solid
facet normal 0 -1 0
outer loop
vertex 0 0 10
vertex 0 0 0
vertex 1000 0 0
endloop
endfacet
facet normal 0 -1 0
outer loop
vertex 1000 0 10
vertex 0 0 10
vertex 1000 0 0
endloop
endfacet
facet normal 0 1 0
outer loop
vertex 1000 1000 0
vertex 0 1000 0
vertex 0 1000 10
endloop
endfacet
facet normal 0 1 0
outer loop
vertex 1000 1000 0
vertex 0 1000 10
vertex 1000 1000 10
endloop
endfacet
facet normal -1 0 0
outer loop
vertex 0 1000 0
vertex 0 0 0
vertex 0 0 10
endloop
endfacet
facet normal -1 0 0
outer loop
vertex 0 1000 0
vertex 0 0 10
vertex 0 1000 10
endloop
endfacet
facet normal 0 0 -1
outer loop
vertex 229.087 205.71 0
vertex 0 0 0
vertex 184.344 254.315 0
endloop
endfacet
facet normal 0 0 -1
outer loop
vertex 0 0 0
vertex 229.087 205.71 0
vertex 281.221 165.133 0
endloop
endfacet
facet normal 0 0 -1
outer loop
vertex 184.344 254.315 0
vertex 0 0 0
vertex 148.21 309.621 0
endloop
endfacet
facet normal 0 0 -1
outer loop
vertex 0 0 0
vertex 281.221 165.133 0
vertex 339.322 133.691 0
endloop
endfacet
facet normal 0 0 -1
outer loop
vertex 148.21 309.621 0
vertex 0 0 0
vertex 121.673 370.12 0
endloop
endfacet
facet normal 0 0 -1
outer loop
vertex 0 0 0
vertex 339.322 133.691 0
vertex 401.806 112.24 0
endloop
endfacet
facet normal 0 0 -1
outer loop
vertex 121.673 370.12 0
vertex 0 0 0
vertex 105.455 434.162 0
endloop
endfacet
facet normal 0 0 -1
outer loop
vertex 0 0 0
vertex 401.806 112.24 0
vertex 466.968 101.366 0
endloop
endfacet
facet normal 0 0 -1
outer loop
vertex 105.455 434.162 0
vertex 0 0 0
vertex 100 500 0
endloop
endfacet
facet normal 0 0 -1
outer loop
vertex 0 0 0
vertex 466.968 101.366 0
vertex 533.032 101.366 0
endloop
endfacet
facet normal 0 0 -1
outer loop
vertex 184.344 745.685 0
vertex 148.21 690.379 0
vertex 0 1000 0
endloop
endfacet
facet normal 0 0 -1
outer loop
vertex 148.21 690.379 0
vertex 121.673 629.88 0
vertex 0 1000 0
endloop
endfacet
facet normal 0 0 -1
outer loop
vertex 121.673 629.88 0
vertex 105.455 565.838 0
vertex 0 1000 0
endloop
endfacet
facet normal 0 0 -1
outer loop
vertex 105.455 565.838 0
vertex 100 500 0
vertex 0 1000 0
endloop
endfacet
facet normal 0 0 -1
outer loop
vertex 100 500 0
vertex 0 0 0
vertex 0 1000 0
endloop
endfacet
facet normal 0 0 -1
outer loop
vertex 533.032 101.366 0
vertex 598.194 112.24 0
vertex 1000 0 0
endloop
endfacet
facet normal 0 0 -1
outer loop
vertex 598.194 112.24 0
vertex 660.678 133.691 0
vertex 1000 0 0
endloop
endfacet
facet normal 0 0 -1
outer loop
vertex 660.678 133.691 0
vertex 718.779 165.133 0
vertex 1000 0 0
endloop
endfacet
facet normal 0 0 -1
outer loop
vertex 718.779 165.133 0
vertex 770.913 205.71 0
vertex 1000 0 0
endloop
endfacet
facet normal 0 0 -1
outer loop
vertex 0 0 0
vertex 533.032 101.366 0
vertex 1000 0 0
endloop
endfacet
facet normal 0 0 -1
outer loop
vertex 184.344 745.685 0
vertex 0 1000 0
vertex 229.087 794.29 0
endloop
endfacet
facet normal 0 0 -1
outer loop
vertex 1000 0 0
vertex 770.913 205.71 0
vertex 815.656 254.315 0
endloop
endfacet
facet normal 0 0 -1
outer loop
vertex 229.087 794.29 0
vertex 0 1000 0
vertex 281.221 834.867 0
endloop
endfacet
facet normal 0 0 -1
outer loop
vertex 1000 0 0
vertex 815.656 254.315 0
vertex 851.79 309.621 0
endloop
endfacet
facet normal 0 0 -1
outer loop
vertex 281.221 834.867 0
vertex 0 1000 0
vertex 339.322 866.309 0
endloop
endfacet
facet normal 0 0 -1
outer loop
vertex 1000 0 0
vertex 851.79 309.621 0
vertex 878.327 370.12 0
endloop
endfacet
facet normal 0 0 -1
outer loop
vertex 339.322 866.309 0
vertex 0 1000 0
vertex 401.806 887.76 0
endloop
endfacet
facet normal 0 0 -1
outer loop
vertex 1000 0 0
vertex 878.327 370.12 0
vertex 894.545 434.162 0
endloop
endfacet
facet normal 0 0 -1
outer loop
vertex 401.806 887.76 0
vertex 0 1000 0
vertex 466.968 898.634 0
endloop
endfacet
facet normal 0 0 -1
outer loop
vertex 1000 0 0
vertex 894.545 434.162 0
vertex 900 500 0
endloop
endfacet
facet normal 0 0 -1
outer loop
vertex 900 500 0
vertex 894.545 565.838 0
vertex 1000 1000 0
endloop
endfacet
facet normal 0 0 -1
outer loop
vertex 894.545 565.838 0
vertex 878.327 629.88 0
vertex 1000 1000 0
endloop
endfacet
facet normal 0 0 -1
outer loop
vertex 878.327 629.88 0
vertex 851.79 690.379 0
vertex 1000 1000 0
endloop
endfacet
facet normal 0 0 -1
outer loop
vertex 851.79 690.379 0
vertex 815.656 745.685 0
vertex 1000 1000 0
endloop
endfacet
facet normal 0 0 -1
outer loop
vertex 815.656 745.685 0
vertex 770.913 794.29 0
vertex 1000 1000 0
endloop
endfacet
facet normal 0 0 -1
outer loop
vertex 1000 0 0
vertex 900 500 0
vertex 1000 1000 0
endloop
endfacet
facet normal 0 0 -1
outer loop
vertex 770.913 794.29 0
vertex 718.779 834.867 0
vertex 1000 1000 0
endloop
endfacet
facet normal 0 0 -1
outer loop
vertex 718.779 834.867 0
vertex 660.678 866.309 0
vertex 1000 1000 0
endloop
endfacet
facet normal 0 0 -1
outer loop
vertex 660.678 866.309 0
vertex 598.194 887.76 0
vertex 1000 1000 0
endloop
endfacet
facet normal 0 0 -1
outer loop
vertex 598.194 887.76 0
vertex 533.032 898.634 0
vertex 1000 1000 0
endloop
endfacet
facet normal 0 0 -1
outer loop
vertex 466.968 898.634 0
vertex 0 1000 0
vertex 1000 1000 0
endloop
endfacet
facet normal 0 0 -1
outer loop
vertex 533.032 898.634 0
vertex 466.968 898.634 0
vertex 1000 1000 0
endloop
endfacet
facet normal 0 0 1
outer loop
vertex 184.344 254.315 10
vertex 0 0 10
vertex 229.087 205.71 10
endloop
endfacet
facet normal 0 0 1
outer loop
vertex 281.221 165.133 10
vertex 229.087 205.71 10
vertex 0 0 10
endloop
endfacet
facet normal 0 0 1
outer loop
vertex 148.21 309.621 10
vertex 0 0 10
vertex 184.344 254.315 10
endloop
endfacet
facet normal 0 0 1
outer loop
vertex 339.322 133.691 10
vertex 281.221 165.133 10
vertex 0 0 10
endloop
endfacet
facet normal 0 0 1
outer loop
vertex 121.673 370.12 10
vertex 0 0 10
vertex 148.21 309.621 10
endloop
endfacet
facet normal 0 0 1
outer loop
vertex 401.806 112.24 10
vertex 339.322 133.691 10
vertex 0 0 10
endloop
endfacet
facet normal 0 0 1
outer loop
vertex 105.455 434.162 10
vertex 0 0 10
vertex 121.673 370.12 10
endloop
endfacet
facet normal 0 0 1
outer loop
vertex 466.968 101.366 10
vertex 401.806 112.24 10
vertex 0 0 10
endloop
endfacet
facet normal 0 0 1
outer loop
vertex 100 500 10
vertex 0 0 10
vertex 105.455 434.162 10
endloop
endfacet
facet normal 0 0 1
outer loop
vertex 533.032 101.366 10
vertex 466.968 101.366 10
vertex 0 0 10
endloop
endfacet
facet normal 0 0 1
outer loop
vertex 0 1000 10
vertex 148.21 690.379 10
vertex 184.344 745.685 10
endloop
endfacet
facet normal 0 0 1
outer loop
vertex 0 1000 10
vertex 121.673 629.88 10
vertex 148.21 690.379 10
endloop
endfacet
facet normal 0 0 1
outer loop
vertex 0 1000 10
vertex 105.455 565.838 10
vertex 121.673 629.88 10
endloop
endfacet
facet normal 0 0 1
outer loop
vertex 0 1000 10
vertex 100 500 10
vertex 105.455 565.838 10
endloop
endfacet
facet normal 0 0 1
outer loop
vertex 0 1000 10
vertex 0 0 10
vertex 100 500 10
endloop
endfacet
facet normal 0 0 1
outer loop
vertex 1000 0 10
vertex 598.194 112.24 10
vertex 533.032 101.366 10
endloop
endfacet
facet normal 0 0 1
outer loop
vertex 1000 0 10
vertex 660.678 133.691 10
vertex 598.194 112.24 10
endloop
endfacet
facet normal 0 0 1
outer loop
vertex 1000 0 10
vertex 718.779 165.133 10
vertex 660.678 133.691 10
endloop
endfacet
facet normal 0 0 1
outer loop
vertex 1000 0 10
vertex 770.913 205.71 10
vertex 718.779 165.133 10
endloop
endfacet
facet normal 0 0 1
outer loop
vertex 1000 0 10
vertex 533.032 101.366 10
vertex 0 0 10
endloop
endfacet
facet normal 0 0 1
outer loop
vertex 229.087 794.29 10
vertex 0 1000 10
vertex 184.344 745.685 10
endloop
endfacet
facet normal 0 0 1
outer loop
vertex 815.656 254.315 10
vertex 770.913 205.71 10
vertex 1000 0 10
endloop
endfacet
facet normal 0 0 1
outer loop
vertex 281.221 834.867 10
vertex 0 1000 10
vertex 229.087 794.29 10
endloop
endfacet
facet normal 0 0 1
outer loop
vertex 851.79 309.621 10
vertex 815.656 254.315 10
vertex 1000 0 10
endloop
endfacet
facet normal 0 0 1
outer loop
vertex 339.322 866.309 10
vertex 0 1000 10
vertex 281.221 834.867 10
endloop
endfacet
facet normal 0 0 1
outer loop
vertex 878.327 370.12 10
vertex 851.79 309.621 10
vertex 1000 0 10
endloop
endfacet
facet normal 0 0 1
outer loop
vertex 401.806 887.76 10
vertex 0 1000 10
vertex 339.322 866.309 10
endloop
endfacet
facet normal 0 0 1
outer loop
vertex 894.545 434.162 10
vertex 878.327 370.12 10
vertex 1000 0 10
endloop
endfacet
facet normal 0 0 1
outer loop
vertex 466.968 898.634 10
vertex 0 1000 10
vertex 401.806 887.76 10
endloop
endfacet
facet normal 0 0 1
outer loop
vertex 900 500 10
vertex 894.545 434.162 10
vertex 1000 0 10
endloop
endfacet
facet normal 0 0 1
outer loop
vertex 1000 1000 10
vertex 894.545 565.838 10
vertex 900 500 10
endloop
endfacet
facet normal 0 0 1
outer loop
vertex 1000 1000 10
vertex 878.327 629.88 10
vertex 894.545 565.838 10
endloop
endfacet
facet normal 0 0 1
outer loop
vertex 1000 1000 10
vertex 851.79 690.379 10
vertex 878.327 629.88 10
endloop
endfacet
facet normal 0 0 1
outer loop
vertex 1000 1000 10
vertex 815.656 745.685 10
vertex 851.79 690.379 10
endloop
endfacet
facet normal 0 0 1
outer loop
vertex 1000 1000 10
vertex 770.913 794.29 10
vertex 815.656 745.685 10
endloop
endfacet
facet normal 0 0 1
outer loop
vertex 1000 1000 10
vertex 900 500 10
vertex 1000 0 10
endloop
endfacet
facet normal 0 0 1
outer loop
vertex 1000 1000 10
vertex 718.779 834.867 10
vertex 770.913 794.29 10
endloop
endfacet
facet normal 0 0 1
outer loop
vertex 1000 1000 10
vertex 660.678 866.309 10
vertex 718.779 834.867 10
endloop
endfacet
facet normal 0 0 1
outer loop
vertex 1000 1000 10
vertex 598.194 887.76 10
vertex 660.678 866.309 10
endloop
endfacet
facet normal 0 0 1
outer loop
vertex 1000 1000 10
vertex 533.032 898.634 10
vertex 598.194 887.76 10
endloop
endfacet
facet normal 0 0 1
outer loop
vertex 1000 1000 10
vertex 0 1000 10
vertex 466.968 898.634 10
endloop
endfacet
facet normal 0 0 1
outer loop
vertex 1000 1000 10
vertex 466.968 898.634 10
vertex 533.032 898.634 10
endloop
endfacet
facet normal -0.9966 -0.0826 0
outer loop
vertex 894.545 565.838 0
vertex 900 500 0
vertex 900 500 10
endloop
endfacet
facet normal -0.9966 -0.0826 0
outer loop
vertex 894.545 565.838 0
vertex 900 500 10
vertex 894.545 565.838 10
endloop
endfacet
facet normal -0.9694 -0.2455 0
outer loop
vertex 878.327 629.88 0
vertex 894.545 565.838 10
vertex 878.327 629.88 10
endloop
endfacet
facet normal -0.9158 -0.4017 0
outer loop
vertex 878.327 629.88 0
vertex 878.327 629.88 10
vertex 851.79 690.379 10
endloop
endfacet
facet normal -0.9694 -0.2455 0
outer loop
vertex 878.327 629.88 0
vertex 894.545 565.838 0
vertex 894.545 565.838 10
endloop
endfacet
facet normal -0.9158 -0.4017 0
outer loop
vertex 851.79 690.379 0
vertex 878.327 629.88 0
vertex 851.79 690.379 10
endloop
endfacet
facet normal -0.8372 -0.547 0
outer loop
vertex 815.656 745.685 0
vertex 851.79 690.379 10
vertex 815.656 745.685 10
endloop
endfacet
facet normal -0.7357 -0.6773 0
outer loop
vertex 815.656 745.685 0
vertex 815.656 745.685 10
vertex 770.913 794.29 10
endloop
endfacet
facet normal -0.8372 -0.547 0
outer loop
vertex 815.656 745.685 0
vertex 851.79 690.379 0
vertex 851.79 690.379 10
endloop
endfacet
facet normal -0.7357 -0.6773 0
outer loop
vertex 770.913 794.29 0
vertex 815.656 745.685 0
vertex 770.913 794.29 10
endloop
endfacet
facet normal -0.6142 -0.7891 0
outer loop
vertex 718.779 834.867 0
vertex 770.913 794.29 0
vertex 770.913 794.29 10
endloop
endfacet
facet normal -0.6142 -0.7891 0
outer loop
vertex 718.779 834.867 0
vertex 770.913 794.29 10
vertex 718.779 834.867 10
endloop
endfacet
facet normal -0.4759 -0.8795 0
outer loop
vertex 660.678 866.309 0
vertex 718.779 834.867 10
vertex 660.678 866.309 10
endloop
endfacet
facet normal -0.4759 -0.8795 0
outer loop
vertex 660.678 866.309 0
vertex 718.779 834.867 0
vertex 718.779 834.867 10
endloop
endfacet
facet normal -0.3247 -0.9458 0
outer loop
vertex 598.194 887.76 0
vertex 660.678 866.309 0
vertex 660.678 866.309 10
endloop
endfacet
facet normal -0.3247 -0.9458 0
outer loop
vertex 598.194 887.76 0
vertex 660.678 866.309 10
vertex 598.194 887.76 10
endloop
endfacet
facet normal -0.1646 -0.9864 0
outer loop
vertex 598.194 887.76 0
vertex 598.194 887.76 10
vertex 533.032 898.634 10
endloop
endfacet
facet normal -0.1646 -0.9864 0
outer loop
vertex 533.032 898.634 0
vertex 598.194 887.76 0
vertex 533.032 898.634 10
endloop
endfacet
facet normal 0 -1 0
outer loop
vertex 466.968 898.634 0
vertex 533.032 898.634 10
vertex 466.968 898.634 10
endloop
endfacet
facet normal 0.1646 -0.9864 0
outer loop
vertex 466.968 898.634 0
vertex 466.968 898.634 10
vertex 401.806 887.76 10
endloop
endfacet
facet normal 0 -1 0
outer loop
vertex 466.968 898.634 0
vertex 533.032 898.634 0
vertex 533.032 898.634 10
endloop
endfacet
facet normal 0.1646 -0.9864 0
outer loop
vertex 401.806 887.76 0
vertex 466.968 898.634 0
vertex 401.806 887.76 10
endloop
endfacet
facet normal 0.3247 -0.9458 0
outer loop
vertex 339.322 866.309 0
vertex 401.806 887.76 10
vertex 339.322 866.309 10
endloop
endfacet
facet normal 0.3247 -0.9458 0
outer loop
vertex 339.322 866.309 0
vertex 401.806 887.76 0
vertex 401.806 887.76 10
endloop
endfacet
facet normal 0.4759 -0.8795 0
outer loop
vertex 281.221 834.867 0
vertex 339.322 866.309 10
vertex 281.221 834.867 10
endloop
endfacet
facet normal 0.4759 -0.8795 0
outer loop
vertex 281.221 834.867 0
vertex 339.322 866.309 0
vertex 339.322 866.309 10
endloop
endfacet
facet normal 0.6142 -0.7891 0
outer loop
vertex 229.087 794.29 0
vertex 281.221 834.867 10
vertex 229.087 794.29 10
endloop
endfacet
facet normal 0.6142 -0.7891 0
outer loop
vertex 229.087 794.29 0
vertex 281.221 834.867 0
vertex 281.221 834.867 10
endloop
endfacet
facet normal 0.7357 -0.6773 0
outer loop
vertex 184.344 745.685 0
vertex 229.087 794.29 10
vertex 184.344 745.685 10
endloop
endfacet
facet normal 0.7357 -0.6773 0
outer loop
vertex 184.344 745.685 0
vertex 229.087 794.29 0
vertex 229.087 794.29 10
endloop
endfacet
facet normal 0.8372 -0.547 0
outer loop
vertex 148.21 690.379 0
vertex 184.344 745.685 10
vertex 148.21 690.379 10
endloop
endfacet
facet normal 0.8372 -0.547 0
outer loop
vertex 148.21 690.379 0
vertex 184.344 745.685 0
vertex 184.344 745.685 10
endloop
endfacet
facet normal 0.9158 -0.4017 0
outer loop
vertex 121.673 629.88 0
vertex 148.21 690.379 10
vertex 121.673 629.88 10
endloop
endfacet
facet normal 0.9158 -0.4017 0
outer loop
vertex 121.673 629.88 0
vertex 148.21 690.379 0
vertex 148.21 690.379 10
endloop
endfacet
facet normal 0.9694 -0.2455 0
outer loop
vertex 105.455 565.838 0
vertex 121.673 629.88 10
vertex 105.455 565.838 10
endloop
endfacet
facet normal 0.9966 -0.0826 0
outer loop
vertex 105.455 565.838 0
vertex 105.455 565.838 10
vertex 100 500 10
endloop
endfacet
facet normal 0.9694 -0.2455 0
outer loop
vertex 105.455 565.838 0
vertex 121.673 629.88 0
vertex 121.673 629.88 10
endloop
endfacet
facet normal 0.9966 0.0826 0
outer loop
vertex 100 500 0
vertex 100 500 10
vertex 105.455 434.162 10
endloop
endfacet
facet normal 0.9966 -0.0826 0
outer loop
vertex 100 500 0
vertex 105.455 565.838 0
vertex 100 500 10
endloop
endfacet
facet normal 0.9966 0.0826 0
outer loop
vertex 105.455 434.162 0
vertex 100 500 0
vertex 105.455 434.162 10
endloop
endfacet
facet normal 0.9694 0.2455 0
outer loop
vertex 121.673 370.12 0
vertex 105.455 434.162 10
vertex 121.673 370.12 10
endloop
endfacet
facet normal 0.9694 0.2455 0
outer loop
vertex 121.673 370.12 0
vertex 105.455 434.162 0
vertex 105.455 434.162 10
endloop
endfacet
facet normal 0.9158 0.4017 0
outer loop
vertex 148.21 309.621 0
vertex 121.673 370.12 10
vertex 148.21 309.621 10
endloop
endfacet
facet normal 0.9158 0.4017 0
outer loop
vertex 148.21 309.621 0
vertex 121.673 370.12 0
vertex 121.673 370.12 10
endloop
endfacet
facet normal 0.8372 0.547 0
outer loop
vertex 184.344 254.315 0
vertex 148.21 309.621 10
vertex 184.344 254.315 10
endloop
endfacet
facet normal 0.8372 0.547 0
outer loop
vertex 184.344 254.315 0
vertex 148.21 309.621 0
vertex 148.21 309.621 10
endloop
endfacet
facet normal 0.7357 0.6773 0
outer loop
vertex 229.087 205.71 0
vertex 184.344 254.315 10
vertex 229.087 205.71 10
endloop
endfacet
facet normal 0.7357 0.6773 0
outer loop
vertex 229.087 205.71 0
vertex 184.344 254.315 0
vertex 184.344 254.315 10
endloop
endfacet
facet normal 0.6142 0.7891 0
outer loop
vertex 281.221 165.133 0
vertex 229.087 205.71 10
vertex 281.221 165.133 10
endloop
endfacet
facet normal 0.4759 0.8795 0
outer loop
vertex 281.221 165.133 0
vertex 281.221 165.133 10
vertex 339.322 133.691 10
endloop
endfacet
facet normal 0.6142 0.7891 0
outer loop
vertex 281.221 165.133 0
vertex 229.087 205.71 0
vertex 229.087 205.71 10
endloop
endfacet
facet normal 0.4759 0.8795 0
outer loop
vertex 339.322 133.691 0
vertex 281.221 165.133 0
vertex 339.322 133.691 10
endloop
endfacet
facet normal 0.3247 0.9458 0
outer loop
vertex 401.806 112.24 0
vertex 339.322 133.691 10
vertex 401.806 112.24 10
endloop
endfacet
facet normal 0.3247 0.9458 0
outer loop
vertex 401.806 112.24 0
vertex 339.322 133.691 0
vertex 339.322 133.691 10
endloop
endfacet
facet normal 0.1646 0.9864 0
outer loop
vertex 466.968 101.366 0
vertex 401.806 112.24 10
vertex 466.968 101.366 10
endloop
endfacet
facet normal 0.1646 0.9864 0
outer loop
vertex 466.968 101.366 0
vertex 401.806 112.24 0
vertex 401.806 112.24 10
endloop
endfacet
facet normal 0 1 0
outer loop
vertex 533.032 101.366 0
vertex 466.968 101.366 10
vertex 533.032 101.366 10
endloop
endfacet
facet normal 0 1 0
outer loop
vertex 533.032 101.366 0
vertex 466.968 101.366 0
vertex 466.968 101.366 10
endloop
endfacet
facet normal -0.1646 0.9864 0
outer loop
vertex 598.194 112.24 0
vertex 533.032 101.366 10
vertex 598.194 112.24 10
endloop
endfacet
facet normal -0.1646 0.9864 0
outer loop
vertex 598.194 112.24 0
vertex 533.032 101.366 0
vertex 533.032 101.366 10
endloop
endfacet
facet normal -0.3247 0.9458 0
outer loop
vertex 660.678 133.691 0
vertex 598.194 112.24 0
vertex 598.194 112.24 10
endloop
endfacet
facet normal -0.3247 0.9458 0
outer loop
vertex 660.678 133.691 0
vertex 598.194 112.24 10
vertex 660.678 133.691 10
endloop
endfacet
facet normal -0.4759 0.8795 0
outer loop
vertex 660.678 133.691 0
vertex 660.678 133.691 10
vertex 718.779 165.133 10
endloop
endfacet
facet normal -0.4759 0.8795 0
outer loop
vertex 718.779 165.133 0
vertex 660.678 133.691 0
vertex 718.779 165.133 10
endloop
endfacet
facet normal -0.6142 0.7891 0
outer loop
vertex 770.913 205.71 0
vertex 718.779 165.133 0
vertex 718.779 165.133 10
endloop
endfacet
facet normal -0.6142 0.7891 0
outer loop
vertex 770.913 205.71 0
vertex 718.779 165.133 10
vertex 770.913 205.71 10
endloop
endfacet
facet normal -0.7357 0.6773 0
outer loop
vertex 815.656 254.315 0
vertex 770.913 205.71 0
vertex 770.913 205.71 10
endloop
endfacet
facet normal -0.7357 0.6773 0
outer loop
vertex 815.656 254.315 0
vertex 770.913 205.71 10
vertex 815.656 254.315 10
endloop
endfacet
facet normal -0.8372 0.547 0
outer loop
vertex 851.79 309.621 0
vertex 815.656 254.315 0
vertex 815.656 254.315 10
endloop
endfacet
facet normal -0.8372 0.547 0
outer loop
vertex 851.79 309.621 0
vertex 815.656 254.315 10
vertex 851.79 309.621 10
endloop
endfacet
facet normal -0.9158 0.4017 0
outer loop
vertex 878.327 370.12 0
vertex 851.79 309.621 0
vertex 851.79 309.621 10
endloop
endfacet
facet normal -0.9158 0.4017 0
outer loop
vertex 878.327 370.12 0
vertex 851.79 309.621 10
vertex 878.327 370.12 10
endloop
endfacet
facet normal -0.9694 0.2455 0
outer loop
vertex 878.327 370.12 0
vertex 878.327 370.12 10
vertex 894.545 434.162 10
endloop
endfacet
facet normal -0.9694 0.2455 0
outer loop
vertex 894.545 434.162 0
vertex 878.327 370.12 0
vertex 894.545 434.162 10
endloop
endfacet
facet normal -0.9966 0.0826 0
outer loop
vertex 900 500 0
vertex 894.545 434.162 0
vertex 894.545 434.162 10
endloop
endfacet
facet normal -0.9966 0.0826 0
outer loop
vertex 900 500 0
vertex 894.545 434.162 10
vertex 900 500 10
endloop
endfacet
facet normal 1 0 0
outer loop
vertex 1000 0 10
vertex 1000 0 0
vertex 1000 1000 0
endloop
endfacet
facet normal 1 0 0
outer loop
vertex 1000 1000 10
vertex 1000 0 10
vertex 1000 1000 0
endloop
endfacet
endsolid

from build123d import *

# Parameters (mm, degrees)
CYLINDER_R     = 400
CYLINDER_DEPTH = 10
BOX_W          = 1000
BOX_H          = 1000
BOX_DEPTH      = 10


with BuildPart() as cylinder:
    # Cylinder → Cylinder (new body)
    with BuildSketch(Plane(origin=(500, 500, 0), x_dir=(1, 0, 0), z_dir=(0, 0, 1))):
        Circle(CYLINDER_R)
    extrude(amount=CYLINDER_DEPTH)


with BuildPart() as cut:
    # Box → Box (new body)
    with BuildSketch(Plane.XY):
        with Locations((500, 500)):
            Rectangle(BOX_W, BOX_H)
    extrude(amount=BOX_DEPTH)

    # Cut: cut Cylinder
    add(cylinder.part, mode=Mode.SUBTRACT)


solid = cut.part
